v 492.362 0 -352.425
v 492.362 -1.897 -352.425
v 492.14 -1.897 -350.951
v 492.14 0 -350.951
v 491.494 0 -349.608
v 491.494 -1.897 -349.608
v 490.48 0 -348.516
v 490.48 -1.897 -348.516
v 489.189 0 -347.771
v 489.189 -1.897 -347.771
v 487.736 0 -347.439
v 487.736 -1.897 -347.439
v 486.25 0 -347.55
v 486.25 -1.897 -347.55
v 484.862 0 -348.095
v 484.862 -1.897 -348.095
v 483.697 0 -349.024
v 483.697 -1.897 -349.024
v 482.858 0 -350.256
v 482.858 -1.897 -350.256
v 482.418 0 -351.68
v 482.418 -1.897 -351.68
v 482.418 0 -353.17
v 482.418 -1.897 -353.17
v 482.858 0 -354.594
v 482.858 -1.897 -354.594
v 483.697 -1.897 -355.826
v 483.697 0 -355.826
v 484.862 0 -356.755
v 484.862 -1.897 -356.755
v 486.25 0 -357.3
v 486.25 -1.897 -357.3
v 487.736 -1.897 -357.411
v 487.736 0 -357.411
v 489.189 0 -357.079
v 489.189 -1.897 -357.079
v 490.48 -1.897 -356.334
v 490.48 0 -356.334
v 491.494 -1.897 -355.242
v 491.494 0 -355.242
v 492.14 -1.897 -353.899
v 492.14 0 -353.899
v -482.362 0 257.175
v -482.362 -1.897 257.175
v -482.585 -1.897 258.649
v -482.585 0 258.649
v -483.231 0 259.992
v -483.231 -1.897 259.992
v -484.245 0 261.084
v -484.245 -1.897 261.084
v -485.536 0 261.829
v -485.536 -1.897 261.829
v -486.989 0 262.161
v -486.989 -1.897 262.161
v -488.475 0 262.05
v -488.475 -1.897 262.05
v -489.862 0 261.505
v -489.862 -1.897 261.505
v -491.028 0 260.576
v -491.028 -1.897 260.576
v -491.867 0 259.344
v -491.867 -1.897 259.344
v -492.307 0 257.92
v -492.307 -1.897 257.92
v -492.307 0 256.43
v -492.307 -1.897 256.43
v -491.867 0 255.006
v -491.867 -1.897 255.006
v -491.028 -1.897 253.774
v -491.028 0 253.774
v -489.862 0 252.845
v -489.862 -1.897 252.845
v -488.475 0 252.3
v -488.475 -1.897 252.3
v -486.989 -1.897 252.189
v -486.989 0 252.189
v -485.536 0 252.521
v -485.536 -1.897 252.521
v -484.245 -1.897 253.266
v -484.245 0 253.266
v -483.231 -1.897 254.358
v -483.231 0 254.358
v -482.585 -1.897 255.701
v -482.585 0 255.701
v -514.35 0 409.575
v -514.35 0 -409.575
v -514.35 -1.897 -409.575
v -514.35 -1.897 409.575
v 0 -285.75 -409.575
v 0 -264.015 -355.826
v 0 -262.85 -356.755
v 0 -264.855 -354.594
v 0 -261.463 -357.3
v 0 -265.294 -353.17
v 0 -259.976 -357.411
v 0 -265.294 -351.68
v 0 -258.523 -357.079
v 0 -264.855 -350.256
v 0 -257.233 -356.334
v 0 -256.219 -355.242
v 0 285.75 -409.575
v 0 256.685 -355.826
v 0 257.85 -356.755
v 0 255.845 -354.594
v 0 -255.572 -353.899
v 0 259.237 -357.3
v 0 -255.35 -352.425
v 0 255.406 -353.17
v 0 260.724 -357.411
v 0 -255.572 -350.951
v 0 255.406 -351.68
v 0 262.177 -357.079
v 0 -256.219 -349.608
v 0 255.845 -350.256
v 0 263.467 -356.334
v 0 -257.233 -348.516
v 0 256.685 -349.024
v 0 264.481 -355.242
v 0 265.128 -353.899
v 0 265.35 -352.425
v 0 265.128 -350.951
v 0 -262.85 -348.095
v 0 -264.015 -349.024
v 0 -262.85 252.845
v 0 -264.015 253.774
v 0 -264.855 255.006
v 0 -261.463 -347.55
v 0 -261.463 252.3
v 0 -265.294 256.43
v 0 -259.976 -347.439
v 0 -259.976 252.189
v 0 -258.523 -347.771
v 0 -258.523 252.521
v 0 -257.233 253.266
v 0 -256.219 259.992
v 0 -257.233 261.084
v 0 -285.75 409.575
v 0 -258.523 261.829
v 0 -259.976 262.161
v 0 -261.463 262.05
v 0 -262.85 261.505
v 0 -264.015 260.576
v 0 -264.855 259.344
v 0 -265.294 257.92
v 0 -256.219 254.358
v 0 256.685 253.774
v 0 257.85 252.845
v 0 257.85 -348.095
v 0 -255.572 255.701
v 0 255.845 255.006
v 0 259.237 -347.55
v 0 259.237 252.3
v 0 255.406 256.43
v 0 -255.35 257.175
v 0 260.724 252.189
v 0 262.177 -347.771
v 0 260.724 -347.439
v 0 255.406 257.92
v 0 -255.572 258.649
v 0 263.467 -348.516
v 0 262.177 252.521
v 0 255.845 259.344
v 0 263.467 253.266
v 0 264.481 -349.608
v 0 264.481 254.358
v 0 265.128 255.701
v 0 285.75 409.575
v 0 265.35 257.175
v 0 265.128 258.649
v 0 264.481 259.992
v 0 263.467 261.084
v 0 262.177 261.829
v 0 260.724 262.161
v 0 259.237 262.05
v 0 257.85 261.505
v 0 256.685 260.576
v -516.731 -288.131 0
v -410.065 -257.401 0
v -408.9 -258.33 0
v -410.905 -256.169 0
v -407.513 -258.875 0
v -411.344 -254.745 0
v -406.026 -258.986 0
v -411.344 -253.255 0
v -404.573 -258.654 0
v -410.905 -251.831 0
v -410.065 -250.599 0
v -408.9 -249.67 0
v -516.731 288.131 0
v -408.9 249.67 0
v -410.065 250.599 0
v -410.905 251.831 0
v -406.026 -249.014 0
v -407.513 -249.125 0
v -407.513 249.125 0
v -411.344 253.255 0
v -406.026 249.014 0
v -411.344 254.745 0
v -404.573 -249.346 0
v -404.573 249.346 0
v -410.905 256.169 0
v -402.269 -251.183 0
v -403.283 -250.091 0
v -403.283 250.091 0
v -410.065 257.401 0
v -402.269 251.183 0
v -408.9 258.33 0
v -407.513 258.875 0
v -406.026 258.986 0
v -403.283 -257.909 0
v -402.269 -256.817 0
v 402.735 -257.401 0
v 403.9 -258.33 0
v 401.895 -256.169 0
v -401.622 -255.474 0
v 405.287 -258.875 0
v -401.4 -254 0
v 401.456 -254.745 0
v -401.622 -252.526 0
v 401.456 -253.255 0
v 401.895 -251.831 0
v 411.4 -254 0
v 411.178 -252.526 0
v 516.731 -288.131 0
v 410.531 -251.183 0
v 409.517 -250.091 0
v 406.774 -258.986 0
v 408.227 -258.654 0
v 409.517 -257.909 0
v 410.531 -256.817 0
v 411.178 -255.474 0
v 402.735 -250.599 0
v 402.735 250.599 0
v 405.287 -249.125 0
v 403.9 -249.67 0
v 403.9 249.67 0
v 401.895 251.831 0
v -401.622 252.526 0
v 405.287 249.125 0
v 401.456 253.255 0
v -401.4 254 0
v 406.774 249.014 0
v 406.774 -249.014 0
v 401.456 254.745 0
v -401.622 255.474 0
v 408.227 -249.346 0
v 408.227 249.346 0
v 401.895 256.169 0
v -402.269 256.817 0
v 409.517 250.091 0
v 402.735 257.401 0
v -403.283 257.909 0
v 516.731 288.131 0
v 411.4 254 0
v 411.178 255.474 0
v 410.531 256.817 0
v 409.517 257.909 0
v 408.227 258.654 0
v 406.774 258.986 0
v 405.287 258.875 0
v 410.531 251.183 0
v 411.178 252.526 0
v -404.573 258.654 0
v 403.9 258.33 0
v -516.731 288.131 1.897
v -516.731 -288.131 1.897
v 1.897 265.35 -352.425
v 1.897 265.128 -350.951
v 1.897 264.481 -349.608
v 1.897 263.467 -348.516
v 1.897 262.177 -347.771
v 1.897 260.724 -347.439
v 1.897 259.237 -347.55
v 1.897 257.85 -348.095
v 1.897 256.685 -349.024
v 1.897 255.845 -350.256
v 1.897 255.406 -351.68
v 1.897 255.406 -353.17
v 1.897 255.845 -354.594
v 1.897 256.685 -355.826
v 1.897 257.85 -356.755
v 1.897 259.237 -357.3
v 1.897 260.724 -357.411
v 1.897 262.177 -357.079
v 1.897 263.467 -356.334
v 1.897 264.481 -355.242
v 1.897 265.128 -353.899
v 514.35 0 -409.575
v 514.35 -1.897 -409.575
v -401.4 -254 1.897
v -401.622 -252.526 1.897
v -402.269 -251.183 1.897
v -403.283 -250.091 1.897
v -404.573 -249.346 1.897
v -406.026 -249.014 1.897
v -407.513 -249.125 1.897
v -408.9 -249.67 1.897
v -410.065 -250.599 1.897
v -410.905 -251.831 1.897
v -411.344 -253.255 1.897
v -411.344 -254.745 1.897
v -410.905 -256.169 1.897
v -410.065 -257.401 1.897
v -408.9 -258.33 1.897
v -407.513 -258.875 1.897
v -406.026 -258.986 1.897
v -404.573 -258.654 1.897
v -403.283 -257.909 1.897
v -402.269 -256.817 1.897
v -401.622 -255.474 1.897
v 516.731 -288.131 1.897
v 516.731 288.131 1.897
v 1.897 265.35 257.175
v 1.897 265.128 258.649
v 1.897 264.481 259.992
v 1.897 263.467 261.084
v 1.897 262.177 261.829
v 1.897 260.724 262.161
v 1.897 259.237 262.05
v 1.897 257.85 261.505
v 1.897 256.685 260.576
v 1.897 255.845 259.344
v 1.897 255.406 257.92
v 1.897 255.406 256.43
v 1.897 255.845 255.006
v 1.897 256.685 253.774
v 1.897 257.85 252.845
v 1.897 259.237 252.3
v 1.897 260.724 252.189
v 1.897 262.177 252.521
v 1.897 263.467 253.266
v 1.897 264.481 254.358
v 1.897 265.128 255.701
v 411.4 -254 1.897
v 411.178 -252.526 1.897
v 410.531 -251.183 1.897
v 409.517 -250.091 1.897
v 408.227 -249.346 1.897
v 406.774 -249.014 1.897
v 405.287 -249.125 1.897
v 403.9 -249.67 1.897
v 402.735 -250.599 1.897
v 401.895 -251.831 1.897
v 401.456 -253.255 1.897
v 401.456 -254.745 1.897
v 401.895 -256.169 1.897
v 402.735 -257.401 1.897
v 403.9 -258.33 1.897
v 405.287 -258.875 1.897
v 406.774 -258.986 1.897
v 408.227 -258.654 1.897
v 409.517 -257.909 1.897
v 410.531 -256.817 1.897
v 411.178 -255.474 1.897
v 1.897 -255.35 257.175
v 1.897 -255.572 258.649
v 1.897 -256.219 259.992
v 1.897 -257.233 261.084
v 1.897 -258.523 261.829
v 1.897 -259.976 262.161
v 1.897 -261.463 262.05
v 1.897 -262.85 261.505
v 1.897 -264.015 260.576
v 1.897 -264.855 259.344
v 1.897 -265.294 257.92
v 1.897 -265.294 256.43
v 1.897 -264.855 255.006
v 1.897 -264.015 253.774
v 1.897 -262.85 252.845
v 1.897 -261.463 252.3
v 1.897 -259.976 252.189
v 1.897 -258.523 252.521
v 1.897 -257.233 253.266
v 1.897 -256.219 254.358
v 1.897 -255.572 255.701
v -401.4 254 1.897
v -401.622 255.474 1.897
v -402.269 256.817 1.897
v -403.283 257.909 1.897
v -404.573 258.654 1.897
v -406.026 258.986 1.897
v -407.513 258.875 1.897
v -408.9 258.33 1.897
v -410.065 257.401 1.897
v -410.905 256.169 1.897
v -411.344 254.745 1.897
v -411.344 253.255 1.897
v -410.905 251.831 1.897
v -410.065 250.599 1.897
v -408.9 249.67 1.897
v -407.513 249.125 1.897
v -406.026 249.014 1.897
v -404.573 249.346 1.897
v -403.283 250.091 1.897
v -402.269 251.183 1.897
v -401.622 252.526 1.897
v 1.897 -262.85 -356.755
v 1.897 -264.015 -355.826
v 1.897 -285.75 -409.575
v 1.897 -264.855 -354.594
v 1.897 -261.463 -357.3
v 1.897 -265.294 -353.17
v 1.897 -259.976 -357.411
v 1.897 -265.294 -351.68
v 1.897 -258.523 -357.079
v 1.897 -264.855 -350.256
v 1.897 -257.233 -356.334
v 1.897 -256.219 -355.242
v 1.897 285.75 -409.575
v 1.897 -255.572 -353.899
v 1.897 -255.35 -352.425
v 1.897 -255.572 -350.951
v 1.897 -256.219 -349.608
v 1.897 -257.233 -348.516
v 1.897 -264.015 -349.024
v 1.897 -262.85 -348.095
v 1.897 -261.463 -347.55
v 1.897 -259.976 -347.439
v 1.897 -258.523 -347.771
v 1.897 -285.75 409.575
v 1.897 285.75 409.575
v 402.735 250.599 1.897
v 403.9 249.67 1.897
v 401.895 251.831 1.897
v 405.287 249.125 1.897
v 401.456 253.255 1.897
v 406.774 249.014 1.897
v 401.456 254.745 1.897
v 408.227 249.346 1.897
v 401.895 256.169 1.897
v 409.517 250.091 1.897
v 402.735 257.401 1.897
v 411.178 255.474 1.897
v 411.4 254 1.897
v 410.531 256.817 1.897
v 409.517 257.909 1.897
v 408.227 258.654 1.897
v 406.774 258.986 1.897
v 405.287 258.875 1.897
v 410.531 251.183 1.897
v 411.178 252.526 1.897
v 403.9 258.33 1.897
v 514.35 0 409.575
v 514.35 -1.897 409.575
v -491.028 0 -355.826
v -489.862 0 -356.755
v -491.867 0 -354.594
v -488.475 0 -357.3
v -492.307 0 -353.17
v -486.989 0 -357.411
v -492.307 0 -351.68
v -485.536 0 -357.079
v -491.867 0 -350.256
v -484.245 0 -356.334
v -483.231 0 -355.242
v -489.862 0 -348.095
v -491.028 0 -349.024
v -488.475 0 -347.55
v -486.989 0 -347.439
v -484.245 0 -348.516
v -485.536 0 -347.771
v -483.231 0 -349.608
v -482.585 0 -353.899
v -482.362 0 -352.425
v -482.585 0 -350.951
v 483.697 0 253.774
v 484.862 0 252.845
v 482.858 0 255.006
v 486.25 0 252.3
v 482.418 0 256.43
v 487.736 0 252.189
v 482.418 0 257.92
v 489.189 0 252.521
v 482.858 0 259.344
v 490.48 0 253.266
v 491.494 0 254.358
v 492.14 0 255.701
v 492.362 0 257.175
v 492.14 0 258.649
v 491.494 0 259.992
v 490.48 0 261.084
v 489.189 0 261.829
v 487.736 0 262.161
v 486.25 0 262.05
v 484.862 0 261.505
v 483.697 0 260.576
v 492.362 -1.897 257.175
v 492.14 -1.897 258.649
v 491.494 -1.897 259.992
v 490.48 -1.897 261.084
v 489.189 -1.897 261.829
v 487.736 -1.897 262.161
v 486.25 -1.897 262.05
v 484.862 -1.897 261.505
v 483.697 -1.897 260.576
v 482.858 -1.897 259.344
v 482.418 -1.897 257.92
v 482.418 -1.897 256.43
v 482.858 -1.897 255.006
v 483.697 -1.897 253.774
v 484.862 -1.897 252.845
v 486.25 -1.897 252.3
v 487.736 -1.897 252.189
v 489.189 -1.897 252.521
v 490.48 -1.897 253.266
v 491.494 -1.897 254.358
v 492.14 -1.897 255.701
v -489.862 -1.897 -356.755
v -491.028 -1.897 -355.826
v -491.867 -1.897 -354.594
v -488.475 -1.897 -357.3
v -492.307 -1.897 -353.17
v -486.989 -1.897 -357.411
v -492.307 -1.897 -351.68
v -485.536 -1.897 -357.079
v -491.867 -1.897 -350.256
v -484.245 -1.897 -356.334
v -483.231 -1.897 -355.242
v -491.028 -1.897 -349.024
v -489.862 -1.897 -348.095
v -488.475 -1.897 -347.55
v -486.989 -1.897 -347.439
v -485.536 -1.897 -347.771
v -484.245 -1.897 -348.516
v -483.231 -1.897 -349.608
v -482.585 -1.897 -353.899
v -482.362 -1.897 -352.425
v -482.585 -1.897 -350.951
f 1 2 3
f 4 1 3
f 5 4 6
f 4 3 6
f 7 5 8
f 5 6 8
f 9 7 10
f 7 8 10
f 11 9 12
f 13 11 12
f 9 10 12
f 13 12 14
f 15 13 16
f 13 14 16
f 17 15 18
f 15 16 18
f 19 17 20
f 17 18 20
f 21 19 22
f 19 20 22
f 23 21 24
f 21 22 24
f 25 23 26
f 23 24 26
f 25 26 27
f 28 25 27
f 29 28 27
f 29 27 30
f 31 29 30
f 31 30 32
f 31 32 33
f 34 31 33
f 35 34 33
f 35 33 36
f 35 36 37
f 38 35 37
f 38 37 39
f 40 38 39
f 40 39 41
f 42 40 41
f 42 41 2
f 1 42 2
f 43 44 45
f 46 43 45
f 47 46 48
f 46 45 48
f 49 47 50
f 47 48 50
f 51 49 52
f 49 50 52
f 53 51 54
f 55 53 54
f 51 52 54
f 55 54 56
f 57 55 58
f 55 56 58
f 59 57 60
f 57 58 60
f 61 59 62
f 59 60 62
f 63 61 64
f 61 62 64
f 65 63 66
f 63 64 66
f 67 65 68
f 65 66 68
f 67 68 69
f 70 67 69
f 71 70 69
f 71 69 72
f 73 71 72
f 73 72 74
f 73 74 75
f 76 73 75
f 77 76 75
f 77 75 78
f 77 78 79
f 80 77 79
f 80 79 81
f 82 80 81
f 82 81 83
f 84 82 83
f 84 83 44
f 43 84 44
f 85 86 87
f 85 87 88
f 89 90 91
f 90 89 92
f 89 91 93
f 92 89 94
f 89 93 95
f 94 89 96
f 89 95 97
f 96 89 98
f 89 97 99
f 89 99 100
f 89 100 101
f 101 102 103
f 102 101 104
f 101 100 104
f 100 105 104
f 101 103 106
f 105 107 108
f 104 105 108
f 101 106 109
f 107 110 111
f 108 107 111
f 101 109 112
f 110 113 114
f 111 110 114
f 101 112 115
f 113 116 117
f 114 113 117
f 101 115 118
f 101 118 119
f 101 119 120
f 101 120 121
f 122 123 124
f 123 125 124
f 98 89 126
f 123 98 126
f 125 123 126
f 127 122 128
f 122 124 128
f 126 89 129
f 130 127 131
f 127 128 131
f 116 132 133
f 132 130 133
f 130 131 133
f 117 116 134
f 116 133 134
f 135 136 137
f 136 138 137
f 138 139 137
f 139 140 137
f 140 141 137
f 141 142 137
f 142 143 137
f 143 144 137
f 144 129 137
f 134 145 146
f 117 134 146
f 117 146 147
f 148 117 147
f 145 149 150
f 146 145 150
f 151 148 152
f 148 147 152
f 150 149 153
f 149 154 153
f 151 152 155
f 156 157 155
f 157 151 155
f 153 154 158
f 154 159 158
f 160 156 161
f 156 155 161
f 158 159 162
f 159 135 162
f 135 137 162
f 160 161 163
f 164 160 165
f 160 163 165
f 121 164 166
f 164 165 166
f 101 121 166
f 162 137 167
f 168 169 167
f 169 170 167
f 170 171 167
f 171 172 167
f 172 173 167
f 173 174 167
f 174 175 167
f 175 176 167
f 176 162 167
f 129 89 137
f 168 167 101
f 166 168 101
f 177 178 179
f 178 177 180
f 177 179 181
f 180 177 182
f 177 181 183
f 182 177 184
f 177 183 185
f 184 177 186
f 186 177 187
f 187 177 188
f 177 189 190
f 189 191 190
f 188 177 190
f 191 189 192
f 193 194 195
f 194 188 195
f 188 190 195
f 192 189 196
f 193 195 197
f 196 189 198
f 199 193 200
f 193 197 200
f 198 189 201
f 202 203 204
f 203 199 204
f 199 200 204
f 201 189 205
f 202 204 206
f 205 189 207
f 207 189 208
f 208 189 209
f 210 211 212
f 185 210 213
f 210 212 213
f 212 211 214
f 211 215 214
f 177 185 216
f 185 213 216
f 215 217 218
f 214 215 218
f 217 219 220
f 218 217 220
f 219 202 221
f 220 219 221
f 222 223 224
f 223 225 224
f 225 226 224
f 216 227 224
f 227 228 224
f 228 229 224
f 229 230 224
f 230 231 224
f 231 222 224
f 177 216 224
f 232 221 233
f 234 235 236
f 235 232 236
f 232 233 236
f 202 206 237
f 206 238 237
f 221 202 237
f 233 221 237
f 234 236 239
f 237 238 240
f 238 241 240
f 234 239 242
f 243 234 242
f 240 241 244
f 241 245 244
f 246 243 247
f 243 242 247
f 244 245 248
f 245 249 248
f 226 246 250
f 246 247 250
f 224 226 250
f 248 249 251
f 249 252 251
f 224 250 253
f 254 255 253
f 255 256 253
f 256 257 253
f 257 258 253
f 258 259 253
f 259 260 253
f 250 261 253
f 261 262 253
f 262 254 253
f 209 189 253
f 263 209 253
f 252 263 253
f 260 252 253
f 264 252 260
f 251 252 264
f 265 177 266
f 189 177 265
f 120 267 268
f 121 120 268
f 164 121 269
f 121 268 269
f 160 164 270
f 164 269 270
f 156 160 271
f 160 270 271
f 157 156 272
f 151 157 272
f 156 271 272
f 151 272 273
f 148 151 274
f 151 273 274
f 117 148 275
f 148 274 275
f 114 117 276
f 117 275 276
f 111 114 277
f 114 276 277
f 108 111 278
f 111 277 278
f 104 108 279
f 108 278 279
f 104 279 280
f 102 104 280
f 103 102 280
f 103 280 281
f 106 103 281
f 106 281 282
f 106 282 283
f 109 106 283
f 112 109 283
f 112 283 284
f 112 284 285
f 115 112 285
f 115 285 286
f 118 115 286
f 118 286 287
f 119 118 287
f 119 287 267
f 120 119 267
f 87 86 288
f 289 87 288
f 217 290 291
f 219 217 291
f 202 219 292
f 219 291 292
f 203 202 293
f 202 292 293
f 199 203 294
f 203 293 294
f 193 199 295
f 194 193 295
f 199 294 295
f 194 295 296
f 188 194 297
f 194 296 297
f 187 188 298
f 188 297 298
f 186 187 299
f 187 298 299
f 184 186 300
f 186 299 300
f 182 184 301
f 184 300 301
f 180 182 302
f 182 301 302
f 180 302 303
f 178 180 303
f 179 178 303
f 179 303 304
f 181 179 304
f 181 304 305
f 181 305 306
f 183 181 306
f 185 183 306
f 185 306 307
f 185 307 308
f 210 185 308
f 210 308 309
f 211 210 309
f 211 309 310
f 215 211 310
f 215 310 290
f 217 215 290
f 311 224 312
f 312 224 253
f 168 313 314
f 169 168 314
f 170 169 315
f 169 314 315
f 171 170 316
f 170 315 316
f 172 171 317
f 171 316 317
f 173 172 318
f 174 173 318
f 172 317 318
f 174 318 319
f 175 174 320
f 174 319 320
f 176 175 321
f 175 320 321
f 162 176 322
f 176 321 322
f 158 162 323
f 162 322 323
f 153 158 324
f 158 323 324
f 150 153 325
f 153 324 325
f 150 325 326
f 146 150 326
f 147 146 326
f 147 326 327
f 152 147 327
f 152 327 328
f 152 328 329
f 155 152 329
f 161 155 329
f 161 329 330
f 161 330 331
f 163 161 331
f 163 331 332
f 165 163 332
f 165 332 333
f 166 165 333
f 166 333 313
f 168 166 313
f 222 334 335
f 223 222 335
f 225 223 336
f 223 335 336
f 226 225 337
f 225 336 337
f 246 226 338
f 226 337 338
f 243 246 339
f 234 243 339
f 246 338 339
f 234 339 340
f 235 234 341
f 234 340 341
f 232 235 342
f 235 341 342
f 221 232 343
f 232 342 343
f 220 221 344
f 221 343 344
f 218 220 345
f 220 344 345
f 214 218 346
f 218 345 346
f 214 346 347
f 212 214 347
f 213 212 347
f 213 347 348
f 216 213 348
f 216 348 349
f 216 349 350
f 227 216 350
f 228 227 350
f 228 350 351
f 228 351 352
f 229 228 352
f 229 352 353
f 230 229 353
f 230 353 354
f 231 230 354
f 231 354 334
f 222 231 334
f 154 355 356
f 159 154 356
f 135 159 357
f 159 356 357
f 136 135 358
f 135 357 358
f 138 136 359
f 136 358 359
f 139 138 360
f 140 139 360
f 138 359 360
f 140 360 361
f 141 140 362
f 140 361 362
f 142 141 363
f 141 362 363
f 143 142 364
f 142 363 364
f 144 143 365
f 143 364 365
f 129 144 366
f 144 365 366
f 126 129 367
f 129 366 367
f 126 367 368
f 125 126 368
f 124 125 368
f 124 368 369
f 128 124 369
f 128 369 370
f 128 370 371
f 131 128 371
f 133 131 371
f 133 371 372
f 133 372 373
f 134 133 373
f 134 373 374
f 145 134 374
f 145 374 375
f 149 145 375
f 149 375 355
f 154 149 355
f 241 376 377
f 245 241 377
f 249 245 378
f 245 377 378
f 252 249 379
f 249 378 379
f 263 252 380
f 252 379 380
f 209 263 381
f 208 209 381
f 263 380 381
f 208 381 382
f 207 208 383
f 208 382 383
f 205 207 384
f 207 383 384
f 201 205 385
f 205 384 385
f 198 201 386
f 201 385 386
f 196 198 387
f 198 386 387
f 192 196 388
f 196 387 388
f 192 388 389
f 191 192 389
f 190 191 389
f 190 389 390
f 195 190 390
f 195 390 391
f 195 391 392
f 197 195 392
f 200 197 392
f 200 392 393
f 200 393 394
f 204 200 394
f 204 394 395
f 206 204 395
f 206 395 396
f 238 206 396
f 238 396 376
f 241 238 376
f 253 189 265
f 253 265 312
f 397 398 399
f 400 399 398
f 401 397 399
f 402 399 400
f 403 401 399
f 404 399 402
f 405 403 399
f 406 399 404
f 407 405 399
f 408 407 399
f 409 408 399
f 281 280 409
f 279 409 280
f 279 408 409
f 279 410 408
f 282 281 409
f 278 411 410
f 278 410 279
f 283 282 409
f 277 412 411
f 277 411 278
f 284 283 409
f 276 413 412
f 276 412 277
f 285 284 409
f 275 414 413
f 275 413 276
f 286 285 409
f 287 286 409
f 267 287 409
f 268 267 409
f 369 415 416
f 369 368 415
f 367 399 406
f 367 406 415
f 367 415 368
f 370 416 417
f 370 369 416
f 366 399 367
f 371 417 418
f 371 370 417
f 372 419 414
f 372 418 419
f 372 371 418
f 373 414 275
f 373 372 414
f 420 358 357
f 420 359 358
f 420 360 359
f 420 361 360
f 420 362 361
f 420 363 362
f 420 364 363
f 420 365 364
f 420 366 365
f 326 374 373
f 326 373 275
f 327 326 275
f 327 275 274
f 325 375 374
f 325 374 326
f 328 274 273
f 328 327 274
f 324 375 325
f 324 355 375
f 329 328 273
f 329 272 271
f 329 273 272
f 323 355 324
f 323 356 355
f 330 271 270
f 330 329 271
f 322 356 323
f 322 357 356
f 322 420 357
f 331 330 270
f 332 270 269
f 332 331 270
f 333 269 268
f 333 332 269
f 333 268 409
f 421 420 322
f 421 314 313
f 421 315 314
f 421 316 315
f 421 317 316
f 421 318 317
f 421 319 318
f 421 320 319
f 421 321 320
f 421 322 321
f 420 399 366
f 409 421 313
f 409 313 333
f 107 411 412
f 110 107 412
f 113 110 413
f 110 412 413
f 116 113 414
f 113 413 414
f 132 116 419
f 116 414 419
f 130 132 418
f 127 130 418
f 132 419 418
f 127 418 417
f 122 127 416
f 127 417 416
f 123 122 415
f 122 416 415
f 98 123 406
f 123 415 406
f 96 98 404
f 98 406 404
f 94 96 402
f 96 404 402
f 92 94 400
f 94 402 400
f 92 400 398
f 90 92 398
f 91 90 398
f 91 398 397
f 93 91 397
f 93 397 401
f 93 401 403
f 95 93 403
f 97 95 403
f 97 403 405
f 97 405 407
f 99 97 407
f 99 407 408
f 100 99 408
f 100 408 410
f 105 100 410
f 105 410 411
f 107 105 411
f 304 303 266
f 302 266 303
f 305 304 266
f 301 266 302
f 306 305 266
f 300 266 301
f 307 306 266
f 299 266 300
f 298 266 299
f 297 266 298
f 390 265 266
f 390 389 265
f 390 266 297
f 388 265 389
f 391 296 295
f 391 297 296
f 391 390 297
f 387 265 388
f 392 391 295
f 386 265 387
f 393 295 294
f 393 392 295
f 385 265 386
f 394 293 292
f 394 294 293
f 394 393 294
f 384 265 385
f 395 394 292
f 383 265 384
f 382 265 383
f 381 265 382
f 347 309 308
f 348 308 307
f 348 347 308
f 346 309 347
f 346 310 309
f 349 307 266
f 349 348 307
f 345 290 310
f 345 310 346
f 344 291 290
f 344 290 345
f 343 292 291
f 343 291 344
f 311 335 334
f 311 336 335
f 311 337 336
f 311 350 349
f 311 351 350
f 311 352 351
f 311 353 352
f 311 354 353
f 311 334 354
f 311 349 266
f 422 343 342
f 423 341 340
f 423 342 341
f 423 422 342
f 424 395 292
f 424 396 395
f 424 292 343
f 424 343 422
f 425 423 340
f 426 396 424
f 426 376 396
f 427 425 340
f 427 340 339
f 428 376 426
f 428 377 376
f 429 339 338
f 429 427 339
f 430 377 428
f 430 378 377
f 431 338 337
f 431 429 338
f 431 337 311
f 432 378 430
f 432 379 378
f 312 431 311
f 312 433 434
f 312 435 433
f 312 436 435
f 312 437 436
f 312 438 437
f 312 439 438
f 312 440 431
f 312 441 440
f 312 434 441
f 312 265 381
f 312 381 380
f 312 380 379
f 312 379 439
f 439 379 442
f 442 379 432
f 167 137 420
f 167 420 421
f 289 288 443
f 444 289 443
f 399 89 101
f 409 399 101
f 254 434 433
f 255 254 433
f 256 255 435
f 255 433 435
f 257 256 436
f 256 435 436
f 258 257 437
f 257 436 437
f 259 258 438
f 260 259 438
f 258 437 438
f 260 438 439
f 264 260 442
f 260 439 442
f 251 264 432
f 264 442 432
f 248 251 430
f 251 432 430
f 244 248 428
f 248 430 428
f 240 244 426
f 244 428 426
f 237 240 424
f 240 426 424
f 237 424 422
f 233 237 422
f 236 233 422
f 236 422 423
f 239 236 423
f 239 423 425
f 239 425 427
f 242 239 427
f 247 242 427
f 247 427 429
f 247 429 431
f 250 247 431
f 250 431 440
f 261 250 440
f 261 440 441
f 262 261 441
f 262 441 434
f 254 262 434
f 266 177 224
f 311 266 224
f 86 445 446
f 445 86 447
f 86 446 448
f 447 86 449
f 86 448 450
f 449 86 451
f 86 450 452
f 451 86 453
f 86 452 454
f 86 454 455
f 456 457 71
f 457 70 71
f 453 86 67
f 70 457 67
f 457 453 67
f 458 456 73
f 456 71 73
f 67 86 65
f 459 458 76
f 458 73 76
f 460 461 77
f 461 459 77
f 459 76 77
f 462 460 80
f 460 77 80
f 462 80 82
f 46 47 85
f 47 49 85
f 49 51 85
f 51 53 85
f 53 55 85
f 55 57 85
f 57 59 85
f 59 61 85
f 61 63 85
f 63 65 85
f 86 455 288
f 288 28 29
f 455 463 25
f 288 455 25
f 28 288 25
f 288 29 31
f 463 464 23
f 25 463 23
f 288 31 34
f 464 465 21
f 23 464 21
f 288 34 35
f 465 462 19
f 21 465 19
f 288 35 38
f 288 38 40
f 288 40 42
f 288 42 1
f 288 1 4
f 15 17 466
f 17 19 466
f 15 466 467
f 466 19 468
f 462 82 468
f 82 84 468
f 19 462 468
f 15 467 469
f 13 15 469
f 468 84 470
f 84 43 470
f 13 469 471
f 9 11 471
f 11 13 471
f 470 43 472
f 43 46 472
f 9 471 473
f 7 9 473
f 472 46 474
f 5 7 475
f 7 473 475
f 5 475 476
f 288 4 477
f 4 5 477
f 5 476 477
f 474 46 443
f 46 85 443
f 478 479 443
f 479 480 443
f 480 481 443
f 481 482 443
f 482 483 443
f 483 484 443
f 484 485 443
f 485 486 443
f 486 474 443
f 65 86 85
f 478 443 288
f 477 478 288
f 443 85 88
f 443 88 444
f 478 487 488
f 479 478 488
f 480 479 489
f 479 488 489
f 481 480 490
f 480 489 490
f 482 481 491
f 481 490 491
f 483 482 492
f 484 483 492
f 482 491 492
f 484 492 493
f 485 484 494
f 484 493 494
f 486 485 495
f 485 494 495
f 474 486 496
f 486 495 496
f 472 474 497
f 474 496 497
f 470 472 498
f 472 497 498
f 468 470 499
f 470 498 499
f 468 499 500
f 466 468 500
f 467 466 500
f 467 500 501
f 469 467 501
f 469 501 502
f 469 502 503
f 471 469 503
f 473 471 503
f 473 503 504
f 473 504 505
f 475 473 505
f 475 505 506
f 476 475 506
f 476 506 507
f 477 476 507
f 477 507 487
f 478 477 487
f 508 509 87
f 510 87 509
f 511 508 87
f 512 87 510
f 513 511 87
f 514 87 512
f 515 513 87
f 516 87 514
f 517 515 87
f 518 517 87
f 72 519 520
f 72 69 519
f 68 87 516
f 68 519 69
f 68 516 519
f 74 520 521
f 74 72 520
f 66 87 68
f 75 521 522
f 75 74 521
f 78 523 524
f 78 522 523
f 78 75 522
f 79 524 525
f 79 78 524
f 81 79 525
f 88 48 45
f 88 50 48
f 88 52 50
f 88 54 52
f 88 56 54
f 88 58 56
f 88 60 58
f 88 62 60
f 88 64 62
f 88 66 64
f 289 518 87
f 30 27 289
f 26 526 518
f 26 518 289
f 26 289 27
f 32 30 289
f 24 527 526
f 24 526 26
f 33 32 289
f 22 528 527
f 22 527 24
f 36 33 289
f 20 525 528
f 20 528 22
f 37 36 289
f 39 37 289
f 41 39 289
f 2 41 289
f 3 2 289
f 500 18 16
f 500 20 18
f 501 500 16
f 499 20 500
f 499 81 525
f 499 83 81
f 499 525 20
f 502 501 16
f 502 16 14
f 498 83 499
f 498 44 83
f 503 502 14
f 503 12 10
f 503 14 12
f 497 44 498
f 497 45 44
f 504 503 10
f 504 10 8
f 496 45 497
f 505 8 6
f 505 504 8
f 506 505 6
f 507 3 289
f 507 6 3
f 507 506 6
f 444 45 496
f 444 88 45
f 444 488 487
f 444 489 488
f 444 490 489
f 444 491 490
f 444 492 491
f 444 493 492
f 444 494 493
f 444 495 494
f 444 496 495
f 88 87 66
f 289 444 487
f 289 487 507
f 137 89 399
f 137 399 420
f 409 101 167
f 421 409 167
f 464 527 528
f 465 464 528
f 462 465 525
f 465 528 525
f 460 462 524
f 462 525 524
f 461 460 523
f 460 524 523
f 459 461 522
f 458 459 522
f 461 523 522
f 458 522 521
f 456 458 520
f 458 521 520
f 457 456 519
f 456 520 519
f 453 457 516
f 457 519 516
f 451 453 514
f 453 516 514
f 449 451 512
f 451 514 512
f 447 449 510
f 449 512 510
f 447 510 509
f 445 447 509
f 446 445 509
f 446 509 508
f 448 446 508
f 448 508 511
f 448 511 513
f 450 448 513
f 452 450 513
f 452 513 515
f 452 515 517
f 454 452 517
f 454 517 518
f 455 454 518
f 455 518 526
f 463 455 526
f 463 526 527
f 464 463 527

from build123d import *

# Parameters (mm, degrees)
F0_W      = 571.5
F0_H      = 819.15
F1_DEPTH  = 1.89738
F2_R      = 5
F3_DEPTH  = 1.89838
F4_W      = 1028.7
F4_H      = 819.15
F5_DEPTH  = 1.89738
F6_R      = 5
F7_DEPTH  = 287.64838
F8_W      = 1033.4625
F8_H      = 576.2625
F9_DEPTH  = 1.89738
F10_R     = 5
F11_DEPTH = 411.47338


with BuildPart() as f1:
    # F0 (on Right) → F1 (new body)
    with BuildSketch(Plane.YZ):
        Rectangle(F0_W, F0_H)
    extrude(amount=F1_DEPTH)

    # F2 (on face) → F3 (cut, through all)
    with BuildSketch(Plane.YZ.offset(1.89738)):
        with Locations((-260.35, 257.175)):
            Circle(F2_R)
        with Locations((-260.35, -352.425)):
            Circle(F2_R)
        with Locations((260.35, 257.175)):
            Circle(F2_R)
        with Locations((260.35, -352.425)):
            Circle(F2_R)
    extrude(amount=-F3_DEPTH, mode=Mode.SUBTRACT)


with BuildPart() as f5:
    # F4 (on Front) → F5 (new body)
    with BuildSketch(Plane.XZ):
        Rectangle(F4_W, F4_H)
    extrude(amount=F5_DEPTH)

    # F6 (on face) → F7 (cut, through all)
    with BuildSketch(Plane.XZ.offset(1.89738)):
        with Locations((-487.3625, 257.175)):
            Circle(F6_R)
        with Locations((487.3625, 257.175)):
            Circle(F6_R)
        with Locations((-487.3625, -352.425)):
            Circle(F6_R)
        with Locations((487.3625, -352.425)):
            Circle(F6_R)
    extrude(amount=-F7_DEPTH, mode=Mode.SUBTRACT)


with BuildPart() as f9:
    # F8 (on Top) → F9 (new body)
    with BuildSketch(Plane.XY):
        Rectangle(F8_W, F8_H)
    extrude(amount=F9_DEPTH)

    # F10 (on face) → F11 (cut, through all)
    with BuildSketch(Plane.XY.offset(1.89738)):
        with Locations((406.4, -254)):
            Circle(F10_R)
        with Locations((-406.4, -254)):
            Circle(F10_R)
        with Locations((406.4, 254)):
            Circle(F10_R)
        with Locations((-406.4, 254)):
            Circle(F10_R)
    extrude(amount=-F11_DEPTH, mode=Mode.SUBTRACT)


solid = Compound([f1.part, f5.part, f9.part])
